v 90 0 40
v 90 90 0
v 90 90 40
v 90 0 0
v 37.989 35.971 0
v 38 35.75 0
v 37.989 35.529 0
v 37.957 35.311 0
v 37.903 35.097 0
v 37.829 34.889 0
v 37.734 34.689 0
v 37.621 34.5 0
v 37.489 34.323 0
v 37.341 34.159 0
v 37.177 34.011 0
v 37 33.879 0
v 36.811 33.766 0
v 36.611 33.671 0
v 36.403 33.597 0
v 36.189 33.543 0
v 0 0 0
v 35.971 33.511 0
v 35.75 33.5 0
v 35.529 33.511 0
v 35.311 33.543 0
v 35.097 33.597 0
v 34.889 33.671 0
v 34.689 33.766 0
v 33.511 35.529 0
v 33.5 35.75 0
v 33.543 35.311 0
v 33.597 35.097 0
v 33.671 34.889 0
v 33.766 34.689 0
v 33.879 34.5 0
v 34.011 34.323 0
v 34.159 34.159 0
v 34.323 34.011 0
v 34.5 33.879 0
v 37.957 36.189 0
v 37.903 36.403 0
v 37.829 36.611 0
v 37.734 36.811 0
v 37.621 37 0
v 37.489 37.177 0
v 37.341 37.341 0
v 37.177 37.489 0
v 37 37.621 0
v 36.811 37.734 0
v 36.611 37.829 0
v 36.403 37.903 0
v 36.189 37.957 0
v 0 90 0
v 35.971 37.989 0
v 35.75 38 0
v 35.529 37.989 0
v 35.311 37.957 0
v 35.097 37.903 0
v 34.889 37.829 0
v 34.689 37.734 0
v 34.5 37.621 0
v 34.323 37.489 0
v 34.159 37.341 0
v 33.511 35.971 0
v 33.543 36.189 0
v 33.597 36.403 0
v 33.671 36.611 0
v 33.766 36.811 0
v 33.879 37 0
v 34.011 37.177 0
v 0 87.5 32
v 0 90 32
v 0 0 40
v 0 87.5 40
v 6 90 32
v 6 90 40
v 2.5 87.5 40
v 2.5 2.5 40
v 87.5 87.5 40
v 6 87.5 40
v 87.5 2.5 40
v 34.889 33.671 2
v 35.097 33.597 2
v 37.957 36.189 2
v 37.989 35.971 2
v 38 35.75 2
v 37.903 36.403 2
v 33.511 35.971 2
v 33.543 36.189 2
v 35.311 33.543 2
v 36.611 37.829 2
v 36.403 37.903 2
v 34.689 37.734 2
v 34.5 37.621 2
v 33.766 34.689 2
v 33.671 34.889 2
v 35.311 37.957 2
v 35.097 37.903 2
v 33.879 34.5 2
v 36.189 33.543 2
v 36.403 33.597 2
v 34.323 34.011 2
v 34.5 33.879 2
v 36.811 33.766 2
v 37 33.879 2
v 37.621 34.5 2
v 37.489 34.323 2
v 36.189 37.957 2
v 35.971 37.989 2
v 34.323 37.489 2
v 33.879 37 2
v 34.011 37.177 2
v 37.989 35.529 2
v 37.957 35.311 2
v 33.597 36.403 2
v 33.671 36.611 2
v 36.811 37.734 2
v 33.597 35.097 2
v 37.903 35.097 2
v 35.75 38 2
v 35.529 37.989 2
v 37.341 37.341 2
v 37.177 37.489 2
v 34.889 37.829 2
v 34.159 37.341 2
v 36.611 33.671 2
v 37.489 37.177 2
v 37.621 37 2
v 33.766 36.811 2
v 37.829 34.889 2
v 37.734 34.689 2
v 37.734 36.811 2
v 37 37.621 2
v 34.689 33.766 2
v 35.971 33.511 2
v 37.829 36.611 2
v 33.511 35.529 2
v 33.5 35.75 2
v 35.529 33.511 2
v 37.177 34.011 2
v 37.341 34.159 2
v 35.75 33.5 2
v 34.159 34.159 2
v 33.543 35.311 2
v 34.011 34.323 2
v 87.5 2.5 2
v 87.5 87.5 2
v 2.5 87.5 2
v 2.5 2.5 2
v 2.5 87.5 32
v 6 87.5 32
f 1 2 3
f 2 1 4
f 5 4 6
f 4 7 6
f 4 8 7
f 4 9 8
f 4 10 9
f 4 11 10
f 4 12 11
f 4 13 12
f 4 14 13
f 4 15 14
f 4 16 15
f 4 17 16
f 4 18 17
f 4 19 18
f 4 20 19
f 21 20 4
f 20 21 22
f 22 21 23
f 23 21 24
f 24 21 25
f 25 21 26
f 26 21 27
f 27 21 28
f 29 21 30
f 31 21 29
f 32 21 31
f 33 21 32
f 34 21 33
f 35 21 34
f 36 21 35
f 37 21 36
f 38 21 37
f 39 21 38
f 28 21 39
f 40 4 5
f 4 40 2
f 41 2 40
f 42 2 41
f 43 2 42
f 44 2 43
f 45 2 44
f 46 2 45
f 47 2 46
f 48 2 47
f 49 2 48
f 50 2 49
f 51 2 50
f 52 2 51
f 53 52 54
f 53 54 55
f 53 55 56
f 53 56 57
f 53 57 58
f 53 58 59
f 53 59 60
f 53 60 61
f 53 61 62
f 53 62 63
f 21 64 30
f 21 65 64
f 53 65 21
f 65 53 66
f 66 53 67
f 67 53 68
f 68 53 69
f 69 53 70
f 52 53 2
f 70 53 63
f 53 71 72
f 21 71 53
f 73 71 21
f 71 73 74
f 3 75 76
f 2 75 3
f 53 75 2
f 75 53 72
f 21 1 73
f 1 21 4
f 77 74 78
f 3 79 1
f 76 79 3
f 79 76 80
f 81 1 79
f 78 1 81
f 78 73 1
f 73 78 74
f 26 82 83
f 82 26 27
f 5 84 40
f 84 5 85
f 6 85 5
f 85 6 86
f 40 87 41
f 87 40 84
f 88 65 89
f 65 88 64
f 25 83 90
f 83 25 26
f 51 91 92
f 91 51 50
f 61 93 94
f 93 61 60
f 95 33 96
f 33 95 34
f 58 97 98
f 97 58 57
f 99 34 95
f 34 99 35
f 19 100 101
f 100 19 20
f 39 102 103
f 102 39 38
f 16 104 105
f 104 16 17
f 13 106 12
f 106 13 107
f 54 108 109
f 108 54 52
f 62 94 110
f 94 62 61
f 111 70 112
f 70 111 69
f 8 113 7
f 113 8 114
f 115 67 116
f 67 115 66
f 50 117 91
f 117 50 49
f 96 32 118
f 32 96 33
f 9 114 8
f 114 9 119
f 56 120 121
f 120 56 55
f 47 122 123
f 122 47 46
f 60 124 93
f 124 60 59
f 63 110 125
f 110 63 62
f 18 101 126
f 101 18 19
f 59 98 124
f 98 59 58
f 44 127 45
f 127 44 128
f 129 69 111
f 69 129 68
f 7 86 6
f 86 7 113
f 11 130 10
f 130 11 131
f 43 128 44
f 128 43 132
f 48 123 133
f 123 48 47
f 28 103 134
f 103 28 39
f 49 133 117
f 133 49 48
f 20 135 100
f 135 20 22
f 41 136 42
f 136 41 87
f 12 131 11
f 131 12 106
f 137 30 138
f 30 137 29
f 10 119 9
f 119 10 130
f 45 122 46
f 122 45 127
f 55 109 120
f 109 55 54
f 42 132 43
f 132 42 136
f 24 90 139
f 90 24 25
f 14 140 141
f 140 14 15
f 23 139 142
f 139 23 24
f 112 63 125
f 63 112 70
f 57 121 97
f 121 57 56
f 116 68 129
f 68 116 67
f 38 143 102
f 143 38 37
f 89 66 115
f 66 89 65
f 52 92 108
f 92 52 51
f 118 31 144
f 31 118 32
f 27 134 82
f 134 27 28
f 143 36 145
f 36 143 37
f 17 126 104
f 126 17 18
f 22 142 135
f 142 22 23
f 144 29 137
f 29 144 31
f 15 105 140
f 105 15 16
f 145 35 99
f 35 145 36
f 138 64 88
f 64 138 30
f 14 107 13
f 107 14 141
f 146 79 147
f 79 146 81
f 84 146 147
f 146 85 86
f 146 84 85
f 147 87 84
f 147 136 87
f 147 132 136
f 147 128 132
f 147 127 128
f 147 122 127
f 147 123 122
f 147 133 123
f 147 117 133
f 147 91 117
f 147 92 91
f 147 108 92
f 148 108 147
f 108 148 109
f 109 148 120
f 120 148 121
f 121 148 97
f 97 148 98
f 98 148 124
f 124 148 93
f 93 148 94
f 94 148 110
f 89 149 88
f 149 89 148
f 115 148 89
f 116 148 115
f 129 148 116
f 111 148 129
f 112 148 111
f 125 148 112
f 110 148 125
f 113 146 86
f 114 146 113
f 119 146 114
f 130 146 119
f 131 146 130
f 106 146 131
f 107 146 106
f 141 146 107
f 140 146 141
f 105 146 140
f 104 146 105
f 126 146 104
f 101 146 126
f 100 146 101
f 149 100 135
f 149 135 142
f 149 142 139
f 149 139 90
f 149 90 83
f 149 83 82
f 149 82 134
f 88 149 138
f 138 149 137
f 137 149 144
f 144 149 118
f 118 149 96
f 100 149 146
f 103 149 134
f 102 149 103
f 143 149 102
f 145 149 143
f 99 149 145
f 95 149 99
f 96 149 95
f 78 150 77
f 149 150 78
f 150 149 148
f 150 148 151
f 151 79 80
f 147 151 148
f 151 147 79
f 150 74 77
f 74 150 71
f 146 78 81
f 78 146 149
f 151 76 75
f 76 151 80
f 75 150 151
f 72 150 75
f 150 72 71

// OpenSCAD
// Magnetic Stirrer Housing
// Designed for an 80mm PC fan.
// Print orientation: Top plate on the bed (z=0).

// Dimensions
outer_dim    = 90.0;    // Outer width and length (mm)
top_thickness = 2.0;    // Thickness of the top plate (mm)
wall_thickness = 2.5;   // Thickness of the four walls (mm)
total_height  = 40.0;   // Total height from top plate to open edge (mm)
hole_diam     = 4.5;    // Diameter of M4 screw holes (mm)
hole_pattern  = 71.5;   // Square pattern for fan mounting holes (mm)
notch_width   = 12.0;   // Width of the cable notch (mm)
notch_depth   = 8.0;    // Depth of the notch from the open edge (mm)

$fn = 64;

// Calculations
wall_height = total_height - top_thickness;
notch_start_z = total_height - notch_depth;

module housing() {
    difference() {
        // Main Body: The top plate and the four walls
        union() {
            // The top plate (sitting on Z=0)
            cube([outer_dim, outer_dim, top_thickness], center = true);
            
            // The four walls
            translate([0, 0, top_thickness + wall_height / 2]) {
                difference() {
                    // Outer boundary of walls
                    cube([outer_dim, outer_dim, wall_height], center = true);
                    // Inner cavity
                    cube([outer_dim - 2 * wall_thickness, outer_dim - 2 * wall_thickness, wall_height + 0.1], center = true);
                }
            }
        }

        // 1. The Cavity (to make it an open box)
        // We subtract the inner volume from the unioned body
        // Note: The union above already creates the walls, so we just need to 
        // ensure the interior is hollow.
        translate([0, 0, top_thickness + wall_height / 2])
            cube([outer_dim - 2 * wall_thickness, outer_dim - 2 * wall_thickness, wall_height + 2], center = true);

        // 2. Screw Holes (M4)
        // Pattern is 71.5mm square, centered.
        // Holes go through the top plate (z=0 to z=2)
        for (sx = [-1, 1], sy = [-1, 1]) {
            translate([sx * hole_pattern / 2, sy * hole_pattern / 2, -1])
                cylinder(h = top_thickness + 2, d = hole_diam);
        }

        // 3. Cable Notch
        // Centered along one wall, reaching 8mm down from the open edge.
        // Open edge is at Z = 40. Notch is from Z = 32 to Z = 40.
        // We'll place it on the wall at +Y.
        translate([0, outer_dim / 2, total_height - notch_depth / 2])
            cube([notch_width, wall_thickness + 2, notch_depth + 0.1], center = true);
    }
}

// The model is built centered on X and Y.
// Since the top plate is 2mm thick and sits on Z=0, 
// we translate the whole assembly so the bottom of the plate is at Z=0.
// The union/difference logic above uses center=true for the cube, 
// so we must adjust the Z-offset.

// Correcting the assembly for Z=0 base:
// The top plate is at Z=0 to Z=2.
// The walls start at Z=2 and go to Z=40.
// To achieve this with center=true, we translate the whole thing.

translate([0, 0, 0]) {
    // The top plate is centered at Z = top_thickness/2
    // The walls are centered at Z = top_thickness + wall_height/2
    // To make the plate sit on Z=0, we must offset the entire assembly.
    // However, the logic above is easier if we build it from Z=0 up.
    
    // Let's redefine the assembly logic to be absolute for clarity.
}

// RE-WRITTEN ASSEMBLY FOR Z=0 BASE
difference() {
    // Outer Shell
    union() {
        // Top Plate
        cube([outer_dim, outer_dim, top_thickness]);
        
        // Walls
        translate([wall_thickness, wall_thickness, top_thickness])
        cube([outer_dim - 2*wall_thickness, outer_dim - 2*wall_thickness, wall_height]);
        
        // The "Outer" box to ensure walls are solid
        translate([0, 0, 0])
        cube([outer_dim, outer_dim, total_height]);
    }
    
    // Subtract the inner void
    translate([wall_thickness, wall_thickness, top_thickness])
        cube([outer_dim - 2*wall_thickness, outer_dim - 2*wall_thickness, wall_height + 1]);
        
    // Subtract Screw Holes
    for (sx = [-1, 1], sy = [-1, 1]) {
        translate([sx * hole_pattern / 2, sy * hole_pattern / 2, -1])
            cylinder(h = top_thickness + 2, d = hole_diam);
    }
    
    // Subtract Cable Notch
    // Centered on Y-wall (at Y = outer_dim)
    // Width is X-axis, Depth is Y-axis, Height is Z-axis
    translate([-notch_width/2, outer_dim - wall_thickness, total_height - notch_depth])
        cube([notch_width, wall_thickness + 2, notch_depth + 1]);
}

// Final check: 
// Top plate: 0 to 2mm.
// Walls: 2 to 40mm.
// Outer: 90x90.
// Notch: 12mm wide, 8mm deep from top (Z=32 to 40).
// Holes: 4.5mm, 71.5mm pattern.
